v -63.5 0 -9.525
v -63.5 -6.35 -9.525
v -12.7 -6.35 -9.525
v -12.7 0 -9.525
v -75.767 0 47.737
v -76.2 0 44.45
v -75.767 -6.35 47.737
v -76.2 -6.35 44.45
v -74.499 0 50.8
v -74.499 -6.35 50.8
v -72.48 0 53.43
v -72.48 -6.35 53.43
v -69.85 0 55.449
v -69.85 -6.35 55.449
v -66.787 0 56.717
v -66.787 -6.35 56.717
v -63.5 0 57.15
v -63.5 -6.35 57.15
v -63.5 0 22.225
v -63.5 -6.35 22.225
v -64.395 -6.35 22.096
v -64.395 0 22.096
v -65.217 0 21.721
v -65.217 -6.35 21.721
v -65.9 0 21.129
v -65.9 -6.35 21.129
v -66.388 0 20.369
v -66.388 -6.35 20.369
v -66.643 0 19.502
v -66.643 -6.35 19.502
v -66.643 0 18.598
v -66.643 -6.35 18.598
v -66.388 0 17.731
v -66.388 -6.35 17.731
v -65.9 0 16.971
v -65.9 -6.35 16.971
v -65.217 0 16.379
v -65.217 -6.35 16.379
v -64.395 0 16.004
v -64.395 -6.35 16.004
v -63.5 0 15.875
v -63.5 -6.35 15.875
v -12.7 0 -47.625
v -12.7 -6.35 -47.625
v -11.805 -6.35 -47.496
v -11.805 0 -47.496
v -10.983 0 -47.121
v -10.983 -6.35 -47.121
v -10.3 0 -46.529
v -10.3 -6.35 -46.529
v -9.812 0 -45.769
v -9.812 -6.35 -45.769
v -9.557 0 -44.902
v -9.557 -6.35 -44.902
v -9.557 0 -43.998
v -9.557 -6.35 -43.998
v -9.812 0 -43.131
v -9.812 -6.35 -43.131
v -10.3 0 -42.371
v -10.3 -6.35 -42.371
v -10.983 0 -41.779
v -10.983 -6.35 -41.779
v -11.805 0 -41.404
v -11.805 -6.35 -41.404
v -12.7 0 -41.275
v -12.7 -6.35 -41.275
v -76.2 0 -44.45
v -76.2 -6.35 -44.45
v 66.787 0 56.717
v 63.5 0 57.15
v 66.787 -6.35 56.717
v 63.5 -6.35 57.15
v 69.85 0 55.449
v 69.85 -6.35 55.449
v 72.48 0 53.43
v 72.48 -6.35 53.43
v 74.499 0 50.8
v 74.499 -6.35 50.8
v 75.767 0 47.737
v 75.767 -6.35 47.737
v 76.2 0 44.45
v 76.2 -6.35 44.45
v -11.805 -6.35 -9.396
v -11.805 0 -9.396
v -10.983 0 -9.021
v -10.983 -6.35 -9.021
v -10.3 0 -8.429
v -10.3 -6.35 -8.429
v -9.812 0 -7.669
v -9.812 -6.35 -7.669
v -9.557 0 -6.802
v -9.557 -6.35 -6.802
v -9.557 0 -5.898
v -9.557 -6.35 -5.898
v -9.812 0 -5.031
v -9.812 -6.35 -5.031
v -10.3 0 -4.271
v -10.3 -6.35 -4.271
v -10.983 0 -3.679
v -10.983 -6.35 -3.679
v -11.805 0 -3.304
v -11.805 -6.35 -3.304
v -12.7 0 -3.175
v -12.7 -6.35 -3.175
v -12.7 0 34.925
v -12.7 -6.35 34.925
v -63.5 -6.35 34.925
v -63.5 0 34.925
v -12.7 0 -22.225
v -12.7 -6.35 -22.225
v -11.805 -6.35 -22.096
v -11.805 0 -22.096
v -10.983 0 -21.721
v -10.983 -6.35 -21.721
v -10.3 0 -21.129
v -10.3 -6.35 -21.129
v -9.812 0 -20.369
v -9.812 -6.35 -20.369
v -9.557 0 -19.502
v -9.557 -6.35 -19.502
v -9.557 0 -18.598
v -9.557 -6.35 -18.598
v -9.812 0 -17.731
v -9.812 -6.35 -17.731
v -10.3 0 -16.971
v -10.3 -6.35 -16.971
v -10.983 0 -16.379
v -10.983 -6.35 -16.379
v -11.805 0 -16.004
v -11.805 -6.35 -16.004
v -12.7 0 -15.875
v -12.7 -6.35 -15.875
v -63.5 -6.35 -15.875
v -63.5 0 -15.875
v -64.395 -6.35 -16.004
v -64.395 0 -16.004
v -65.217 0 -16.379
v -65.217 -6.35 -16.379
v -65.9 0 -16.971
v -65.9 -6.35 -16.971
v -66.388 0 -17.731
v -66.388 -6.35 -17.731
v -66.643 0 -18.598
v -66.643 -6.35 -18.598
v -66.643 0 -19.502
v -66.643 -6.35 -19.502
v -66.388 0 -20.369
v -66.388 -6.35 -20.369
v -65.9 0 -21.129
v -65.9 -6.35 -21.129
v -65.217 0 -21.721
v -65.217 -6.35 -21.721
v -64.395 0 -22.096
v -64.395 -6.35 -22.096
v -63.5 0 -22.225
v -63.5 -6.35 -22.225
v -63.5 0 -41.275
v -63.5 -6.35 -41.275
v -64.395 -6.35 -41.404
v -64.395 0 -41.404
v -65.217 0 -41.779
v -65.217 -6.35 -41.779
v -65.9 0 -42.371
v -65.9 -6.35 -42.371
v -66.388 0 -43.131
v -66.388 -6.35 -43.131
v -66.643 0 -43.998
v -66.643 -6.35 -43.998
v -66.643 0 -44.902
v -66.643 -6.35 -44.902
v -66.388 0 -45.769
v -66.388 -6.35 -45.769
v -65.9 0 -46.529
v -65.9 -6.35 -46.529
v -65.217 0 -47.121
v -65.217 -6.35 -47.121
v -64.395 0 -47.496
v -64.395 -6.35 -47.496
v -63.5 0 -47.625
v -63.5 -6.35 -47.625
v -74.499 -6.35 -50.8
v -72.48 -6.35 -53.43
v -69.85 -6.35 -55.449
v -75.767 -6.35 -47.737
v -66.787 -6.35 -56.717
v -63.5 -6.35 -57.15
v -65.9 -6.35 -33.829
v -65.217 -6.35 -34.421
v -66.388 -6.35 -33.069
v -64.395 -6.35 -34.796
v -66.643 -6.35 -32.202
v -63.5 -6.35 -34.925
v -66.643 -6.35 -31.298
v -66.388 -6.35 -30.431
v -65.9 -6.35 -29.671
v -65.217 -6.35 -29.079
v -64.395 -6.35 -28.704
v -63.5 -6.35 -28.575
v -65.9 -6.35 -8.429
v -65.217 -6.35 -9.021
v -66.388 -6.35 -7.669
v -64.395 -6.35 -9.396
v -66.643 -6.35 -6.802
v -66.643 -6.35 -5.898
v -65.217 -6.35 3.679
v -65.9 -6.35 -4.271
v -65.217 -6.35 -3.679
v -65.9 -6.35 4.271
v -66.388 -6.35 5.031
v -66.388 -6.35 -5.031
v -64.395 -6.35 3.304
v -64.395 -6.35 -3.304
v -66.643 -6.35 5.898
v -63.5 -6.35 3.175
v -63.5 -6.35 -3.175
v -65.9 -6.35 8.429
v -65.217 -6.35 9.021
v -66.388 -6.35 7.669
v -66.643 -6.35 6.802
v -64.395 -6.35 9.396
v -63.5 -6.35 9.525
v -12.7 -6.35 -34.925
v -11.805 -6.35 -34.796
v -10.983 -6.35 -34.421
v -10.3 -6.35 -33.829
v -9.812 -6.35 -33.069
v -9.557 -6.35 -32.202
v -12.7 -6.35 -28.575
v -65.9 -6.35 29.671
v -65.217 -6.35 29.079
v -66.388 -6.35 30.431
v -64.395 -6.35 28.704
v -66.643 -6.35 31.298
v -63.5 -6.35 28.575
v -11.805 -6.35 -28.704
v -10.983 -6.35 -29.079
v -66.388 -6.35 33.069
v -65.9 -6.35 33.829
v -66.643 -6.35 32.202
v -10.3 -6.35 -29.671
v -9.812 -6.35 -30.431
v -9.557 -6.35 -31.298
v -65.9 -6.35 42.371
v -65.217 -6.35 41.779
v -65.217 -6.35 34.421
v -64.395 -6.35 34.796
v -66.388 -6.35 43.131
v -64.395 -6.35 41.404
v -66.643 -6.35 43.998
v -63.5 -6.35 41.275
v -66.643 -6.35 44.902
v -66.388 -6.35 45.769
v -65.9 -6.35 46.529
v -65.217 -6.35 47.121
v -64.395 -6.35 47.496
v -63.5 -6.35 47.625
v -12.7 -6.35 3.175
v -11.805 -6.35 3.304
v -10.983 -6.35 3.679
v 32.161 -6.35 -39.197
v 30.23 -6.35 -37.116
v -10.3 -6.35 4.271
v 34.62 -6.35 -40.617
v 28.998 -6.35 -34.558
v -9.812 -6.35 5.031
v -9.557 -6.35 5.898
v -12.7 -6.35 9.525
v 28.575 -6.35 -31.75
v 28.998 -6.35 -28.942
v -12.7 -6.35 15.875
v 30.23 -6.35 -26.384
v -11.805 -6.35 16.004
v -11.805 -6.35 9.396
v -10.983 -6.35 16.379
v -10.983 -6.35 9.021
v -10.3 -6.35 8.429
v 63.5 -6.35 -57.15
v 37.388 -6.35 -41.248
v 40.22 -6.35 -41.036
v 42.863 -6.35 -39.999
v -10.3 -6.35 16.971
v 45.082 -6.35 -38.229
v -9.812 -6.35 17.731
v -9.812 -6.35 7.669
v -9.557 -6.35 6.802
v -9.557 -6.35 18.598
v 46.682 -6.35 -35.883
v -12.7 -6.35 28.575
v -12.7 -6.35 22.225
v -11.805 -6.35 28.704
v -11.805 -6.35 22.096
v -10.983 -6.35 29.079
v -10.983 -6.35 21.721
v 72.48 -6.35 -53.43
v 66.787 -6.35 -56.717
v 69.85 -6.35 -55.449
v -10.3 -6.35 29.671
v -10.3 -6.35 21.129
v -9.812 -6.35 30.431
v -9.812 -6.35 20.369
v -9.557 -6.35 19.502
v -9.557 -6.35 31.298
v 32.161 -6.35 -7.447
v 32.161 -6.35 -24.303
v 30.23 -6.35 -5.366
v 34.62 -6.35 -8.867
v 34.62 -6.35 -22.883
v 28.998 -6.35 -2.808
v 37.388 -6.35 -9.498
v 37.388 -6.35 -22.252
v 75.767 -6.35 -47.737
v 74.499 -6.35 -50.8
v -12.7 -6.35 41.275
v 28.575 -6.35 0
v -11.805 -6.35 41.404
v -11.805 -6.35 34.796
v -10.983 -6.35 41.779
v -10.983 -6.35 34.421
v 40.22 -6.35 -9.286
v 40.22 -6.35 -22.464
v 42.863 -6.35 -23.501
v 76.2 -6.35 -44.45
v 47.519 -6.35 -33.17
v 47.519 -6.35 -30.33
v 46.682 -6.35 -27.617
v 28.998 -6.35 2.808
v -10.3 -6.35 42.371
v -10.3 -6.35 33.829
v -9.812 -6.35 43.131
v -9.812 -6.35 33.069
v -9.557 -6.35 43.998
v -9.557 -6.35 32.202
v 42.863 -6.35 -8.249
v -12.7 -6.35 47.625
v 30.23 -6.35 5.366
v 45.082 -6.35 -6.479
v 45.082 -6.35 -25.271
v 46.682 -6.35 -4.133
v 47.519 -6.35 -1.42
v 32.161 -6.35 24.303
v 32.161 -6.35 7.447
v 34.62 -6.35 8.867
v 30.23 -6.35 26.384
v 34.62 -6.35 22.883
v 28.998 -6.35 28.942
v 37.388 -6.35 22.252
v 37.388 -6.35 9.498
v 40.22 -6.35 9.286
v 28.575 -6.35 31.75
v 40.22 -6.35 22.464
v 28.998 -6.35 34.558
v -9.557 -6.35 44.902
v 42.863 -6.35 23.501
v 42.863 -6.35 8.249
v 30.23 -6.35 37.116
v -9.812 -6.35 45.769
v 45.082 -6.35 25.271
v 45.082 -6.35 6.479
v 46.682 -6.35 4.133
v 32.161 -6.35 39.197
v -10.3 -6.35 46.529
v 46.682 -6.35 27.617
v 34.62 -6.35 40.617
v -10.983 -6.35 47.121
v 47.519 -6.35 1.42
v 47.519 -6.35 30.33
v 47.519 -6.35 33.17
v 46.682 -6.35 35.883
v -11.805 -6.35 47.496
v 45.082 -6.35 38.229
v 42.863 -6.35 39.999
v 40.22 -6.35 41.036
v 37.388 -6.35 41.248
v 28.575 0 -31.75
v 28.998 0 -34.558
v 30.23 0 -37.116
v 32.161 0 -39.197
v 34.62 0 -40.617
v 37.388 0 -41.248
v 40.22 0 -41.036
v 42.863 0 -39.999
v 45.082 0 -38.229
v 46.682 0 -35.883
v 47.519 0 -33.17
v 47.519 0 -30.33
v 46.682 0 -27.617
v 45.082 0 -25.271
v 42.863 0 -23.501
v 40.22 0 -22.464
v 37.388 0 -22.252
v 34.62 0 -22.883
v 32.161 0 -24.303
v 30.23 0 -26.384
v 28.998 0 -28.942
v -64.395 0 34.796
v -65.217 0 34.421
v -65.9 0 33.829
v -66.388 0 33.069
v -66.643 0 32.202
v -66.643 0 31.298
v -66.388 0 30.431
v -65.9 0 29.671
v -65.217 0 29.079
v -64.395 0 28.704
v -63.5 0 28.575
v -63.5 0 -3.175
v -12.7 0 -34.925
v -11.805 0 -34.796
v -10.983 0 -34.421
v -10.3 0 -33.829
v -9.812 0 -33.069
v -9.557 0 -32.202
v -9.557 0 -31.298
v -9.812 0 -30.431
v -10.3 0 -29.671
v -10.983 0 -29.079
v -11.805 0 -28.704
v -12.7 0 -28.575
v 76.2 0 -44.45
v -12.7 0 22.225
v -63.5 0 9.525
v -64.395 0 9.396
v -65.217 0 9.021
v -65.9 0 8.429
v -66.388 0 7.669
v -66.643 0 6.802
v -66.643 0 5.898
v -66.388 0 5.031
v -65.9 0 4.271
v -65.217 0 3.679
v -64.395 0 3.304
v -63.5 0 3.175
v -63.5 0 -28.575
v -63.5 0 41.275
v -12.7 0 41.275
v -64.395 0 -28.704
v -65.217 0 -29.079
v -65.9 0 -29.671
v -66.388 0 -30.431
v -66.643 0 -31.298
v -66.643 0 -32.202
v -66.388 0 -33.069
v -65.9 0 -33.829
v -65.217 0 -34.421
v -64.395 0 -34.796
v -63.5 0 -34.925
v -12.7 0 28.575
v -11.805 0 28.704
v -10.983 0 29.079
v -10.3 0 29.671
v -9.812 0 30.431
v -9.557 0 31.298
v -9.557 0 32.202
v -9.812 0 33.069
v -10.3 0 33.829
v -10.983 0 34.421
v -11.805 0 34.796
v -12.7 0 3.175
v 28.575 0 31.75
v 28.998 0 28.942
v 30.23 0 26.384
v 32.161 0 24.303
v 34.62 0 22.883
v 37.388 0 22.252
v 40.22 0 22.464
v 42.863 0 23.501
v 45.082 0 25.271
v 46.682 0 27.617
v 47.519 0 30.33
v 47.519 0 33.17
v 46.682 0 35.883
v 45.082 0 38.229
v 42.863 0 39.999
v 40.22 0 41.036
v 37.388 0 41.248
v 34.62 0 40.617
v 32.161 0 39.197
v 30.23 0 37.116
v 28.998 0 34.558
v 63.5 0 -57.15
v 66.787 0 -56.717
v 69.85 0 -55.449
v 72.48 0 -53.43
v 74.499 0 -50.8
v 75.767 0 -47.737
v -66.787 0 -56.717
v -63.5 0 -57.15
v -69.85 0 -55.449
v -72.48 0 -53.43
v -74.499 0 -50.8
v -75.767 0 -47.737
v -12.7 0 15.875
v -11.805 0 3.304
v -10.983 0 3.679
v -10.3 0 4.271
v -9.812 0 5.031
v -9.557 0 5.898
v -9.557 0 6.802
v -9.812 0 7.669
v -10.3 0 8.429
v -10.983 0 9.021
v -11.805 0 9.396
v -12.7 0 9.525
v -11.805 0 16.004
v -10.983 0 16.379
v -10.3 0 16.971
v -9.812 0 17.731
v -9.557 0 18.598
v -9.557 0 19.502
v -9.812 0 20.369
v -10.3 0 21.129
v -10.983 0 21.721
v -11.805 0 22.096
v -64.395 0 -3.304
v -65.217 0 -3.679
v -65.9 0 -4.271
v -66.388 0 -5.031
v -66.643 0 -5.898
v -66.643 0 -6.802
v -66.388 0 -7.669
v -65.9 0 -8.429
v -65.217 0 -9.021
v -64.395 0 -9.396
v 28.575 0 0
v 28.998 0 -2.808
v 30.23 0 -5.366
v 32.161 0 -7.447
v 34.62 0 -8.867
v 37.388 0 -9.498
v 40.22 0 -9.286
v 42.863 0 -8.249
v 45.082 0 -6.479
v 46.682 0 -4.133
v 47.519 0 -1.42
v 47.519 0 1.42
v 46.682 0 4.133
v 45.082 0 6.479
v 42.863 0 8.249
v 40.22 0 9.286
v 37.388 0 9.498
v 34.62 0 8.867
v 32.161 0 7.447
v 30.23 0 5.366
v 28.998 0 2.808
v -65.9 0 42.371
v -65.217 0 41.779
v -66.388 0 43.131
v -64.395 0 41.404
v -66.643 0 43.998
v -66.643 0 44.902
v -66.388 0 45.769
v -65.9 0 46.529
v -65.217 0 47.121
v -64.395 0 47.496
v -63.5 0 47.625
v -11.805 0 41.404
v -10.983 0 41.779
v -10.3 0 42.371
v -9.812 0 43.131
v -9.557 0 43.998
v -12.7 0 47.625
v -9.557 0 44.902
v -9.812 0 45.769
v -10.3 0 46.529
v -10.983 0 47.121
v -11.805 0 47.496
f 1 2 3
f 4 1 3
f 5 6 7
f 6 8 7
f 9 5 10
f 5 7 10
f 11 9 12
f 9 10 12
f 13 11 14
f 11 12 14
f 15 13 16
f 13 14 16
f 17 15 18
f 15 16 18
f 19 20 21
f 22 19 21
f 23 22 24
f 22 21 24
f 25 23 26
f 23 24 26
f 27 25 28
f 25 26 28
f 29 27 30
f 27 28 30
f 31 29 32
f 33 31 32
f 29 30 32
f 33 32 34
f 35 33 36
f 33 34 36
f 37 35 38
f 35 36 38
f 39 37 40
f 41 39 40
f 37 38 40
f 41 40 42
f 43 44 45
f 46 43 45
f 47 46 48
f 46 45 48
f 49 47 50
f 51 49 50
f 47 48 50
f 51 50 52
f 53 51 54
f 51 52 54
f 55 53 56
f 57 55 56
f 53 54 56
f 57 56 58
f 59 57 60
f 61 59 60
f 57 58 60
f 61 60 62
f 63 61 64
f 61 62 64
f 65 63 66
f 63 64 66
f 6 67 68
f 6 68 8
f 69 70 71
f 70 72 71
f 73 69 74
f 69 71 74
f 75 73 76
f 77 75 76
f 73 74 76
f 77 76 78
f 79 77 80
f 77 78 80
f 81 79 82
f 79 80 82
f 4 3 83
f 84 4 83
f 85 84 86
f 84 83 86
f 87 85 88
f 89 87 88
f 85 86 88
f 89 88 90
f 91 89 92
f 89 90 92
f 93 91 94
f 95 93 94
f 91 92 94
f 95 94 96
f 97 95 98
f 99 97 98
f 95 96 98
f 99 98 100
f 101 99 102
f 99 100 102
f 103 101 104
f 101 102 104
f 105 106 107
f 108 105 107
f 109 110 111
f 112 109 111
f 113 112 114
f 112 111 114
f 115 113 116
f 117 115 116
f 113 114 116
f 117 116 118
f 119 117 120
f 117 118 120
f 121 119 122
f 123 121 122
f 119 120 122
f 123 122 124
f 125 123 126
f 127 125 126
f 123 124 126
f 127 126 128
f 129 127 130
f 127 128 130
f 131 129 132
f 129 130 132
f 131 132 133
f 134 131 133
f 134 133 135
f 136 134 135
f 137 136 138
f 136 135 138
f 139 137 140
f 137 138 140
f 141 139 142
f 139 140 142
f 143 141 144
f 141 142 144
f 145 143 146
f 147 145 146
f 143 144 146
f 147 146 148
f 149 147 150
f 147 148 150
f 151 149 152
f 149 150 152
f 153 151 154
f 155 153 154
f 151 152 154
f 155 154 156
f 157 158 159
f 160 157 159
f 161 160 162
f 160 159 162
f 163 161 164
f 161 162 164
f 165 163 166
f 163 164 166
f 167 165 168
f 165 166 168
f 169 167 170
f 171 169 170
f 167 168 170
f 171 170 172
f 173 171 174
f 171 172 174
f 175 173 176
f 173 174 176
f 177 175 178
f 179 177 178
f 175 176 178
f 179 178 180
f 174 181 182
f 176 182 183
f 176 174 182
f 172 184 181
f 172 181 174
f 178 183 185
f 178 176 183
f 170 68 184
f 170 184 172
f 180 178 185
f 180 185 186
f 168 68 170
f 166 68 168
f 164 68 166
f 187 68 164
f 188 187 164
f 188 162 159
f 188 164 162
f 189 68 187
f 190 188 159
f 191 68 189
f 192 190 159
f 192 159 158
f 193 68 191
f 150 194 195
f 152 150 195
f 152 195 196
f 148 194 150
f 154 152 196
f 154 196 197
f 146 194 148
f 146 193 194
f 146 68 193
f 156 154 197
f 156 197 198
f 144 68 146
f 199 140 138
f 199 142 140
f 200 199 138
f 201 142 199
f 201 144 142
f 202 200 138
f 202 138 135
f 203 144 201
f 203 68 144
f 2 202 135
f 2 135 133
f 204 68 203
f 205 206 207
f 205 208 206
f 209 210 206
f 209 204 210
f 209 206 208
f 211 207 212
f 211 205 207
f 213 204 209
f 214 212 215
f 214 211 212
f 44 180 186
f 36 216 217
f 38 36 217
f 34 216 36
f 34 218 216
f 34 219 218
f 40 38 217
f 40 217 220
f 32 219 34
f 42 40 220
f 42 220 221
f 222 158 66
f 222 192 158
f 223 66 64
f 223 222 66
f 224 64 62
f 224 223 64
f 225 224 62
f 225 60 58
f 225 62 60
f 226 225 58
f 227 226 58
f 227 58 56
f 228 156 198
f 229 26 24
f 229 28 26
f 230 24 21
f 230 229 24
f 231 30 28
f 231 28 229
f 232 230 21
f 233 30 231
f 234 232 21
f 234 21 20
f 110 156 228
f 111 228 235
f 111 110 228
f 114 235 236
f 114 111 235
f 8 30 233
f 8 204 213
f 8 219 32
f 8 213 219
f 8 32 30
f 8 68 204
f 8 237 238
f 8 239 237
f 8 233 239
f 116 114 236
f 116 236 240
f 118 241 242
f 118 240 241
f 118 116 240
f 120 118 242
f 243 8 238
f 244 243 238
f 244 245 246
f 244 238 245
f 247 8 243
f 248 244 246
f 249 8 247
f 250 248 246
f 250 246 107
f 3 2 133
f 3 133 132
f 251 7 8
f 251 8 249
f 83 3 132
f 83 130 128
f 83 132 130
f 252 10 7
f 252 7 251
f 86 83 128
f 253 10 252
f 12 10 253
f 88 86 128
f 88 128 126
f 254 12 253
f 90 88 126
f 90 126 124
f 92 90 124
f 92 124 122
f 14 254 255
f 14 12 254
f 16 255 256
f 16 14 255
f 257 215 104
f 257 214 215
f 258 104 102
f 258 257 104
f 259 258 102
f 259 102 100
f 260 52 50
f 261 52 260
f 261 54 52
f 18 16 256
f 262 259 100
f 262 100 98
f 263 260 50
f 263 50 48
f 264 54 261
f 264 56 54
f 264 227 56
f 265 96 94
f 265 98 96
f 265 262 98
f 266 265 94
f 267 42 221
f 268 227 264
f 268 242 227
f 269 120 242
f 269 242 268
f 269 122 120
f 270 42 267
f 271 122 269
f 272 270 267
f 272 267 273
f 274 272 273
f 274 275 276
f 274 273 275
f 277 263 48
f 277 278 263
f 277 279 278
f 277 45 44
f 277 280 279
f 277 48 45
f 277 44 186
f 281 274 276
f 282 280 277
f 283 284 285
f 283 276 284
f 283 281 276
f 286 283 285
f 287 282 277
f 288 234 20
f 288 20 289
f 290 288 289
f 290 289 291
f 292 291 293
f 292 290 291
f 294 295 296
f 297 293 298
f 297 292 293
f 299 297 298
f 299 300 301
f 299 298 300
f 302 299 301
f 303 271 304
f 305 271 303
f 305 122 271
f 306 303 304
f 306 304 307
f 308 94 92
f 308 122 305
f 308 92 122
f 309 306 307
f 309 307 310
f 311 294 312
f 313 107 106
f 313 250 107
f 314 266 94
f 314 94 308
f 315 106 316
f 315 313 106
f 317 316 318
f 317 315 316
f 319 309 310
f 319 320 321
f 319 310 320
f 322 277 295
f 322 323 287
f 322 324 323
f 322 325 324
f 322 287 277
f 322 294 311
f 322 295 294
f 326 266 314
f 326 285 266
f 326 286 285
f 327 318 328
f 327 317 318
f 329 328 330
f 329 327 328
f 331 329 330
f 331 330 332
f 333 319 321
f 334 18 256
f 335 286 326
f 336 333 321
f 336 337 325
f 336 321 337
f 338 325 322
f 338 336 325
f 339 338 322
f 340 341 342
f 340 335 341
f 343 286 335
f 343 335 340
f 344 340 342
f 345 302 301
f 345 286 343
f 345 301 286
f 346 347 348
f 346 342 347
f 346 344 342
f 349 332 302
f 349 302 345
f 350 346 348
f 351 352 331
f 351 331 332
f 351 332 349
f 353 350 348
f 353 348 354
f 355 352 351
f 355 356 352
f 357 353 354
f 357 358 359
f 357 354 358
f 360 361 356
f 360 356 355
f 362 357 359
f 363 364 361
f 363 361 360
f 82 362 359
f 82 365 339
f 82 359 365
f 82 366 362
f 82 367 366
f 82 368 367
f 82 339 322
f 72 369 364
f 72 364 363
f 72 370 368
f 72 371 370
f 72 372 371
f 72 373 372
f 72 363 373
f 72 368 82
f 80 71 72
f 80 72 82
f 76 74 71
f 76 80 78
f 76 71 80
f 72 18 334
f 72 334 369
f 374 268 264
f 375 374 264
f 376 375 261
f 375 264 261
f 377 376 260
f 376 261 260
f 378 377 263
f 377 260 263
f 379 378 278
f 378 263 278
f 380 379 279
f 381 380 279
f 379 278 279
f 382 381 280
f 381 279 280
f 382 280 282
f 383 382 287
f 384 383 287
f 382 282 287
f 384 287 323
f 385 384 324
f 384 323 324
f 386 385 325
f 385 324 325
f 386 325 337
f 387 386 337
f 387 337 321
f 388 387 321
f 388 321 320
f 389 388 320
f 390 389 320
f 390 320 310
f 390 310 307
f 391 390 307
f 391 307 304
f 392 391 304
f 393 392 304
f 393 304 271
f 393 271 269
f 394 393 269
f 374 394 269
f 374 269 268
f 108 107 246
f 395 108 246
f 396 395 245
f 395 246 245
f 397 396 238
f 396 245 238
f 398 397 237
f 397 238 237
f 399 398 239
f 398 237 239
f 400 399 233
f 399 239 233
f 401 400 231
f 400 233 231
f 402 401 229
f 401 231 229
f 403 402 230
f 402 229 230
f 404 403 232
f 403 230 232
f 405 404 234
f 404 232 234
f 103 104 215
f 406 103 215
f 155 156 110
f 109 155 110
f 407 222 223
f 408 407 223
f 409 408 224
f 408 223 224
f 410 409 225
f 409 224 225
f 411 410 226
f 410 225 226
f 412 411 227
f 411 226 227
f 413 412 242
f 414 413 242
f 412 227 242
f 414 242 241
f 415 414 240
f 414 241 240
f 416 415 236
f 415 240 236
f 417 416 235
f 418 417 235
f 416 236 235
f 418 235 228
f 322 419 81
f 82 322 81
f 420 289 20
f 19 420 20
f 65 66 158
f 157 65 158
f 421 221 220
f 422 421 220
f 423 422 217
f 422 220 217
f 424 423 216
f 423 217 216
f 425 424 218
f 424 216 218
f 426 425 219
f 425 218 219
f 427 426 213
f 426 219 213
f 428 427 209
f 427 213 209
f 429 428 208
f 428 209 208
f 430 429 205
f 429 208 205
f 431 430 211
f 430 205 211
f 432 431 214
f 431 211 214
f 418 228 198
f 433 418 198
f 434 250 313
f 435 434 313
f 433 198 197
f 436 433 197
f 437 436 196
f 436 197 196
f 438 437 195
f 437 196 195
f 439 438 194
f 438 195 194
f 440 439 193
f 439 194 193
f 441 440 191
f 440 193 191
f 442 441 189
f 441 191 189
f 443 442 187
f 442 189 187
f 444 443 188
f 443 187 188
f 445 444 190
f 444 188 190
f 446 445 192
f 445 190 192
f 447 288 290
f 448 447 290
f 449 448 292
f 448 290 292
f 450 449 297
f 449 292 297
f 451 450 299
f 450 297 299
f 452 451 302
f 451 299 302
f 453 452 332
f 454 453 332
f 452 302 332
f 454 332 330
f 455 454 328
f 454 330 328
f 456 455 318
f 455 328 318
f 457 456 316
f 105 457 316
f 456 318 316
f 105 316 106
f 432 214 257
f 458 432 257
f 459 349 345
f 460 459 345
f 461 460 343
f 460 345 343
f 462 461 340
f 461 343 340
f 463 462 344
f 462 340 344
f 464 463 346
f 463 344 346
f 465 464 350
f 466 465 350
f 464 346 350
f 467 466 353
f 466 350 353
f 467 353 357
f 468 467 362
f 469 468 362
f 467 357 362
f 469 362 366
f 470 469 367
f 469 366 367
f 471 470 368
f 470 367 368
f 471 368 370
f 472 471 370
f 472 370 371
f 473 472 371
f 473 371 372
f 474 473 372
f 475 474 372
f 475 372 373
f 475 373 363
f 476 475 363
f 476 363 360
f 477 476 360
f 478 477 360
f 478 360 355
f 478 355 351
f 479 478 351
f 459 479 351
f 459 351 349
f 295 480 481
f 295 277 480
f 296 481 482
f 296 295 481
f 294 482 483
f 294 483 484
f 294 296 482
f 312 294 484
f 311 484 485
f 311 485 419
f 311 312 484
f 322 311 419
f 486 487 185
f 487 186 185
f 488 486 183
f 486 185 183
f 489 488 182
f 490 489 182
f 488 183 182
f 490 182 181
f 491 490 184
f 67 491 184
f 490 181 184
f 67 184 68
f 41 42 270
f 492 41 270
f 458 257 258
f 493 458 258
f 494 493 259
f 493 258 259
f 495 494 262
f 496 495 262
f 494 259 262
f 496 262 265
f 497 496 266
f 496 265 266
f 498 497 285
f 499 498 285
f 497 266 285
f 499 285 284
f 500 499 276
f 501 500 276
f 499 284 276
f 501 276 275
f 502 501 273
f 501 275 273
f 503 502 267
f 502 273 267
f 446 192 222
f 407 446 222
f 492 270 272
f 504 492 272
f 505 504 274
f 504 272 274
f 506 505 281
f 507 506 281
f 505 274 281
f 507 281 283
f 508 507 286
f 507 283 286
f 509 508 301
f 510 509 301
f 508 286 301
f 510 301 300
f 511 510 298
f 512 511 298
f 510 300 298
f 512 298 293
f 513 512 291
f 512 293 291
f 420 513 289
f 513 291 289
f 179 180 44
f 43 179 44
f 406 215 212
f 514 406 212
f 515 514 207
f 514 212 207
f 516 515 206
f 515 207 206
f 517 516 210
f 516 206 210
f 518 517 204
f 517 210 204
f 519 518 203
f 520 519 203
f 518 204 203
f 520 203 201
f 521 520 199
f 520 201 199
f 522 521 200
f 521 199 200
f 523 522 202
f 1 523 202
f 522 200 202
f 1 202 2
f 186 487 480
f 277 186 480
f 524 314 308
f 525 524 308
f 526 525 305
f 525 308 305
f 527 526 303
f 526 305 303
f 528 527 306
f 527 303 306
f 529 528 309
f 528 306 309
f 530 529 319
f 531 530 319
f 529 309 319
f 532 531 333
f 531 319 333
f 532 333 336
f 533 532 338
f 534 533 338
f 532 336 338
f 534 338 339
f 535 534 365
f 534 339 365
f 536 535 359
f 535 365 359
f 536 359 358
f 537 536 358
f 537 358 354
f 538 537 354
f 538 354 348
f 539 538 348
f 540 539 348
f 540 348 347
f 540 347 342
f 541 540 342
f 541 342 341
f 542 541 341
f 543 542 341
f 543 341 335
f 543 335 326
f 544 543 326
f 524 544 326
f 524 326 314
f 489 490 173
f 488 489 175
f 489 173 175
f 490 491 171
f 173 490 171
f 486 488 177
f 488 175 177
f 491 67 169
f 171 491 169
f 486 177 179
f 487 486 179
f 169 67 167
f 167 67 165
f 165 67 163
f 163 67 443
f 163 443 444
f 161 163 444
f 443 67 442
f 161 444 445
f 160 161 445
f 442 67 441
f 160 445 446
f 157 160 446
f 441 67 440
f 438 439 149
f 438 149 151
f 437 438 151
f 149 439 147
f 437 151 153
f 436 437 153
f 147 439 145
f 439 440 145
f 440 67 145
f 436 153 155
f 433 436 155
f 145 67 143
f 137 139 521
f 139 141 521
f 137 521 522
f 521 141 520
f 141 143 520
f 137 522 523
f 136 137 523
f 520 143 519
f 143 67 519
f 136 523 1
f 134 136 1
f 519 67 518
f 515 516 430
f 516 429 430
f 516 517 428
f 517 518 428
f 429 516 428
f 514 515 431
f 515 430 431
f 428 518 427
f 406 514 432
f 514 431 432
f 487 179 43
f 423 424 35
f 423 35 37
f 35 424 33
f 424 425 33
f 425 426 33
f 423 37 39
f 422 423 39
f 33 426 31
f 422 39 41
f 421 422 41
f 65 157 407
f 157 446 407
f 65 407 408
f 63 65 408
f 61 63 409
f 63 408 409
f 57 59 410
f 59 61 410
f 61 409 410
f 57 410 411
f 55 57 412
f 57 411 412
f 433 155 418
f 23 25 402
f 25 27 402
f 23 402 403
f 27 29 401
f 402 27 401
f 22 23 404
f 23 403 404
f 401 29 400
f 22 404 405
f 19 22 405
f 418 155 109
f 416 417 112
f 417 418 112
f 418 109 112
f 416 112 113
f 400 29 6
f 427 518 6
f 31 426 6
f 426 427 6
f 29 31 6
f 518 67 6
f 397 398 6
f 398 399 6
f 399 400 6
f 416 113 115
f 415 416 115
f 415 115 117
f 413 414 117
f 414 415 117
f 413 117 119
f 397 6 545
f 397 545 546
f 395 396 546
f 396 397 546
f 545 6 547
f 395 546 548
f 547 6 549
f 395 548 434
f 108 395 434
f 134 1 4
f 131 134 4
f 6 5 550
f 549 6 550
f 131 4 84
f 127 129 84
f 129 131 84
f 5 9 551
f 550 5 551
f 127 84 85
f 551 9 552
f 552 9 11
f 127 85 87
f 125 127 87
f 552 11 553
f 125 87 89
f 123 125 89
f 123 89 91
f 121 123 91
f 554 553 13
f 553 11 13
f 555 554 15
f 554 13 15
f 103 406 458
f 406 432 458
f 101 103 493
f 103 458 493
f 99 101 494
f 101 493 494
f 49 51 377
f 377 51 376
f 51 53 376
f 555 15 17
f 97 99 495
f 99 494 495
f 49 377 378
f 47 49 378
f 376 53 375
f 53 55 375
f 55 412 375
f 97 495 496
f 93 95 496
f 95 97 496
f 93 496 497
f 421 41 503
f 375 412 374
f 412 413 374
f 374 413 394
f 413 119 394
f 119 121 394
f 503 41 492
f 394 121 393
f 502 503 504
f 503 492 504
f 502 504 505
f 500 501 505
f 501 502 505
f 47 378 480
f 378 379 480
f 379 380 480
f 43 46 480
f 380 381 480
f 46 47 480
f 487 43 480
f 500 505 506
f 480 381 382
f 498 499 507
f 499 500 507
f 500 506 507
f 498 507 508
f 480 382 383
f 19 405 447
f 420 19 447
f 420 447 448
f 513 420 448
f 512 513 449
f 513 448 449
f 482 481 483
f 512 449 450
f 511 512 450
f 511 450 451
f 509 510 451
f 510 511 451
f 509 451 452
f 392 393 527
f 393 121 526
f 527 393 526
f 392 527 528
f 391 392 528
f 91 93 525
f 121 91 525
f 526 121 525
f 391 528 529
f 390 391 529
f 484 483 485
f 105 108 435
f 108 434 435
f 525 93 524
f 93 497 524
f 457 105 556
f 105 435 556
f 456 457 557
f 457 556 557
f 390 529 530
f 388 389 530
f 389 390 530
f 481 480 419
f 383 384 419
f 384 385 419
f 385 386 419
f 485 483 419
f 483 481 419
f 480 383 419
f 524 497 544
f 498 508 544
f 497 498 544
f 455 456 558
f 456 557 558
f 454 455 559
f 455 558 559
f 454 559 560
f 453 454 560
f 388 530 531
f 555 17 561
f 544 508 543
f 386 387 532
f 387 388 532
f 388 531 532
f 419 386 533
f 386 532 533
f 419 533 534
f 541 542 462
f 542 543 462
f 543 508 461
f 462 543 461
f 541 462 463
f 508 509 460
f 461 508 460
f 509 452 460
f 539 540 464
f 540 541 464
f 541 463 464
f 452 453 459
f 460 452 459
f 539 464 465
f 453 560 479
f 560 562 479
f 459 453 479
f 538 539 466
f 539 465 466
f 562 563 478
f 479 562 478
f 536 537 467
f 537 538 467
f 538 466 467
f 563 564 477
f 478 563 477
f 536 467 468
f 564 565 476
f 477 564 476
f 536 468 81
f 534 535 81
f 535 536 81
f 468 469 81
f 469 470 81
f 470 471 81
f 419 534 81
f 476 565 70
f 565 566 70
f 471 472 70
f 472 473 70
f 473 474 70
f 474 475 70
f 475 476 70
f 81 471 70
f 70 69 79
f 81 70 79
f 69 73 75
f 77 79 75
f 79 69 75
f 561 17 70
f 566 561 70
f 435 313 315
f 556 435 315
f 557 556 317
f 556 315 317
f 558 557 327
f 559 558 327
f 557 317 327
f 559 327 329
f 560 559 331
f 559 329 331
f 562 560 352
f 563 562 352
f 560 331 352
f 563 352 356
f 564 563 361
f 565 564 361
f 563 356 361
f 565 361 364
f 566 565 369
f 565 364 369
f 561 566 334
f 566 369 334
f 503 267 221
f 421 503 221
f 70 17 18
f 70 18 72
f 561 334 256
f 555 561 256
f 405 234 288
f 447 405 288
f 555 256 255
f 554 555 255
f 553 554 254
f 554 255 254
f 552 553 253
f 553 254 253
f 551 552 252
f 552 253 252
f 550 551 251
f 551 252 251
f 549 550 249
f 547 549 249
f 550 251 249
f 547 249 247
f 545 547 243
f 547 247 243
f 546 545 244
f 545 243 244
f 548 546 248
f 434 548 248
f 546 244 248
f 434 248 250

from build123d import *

# Parameters (mm, degrees)
F0_W     = 152.4
F0_H     = 114.3
F1_DEPTH = 6.35
F3_DEPTH = 6.351
F5_D     = 19.05
F6_R     = 12.7
F7_R     = 12.7


with BuildPart() as f1:
    # F0 (on Front) → F1 (new body)
    with BuildSketch(Plane.XZ):
        Rectangle(F0_W, F0_H)
    extrude(amount=F1_DEPTH)

    # F2 (on face) → F3 (cut, through all)
    with BuildSketch(Plane.XZ.offset(6.35)):
        with BuildLine():
            Line((-12.7, 47.625), (-63.5, 47.625))
            ThreePointArc((-63.5, 47.625), (-66.675, 44.45), (-63.5, 41.275))
            Line((-63.5, 41.275), (-12.7, 41.275))
            ThreePointArc((-12.7, 41.275), (-9.525, 44.45), (-12.7, 47.625))
        make_face()
        with BuildLine():
            Line((-12.7, -41.275), (-63.5, -41.275))
            ThreePointArc((-63.5, -41.275), (-66.675, -44.45), (-63.5, -47.625))
            Line((-63.5, -47.625), (-12.7, -47.625))
            ThreePointArc((-12.7, -47.625), (-9.525, -44.45), (-12.7, -41.275))
        make_face()
        with BuildLine():
            ThreePointArc((-63.5, 34.925), (-66.675, 31.75), (-63.5, 28.575))
            Line((-63.5, 28.575), (-12.7, 28.575))
            ThreePointArc((-12.7, 28.575), (-9.525, 31.75), (-12.7, 34.925))
            Line((-12.7, 34.925), (-63.5, 34.925))
        make_face()
        with BuildLine():
            Line((-12.7, -28.575), (-63.5, -28.575))
            ThreePointArc((-63.5, -28.575), (-66.675, -31.75), (-63.5, -34.925))
            Line((-63.5, -34.925), (-12.7, -34.925))
            ThreePointArc((-12.7, -34.925), (-9.525, -31.75), (-12.7, -28.575))
        make_face()
        with BuildLine():
            Line((-12.7, 22.225), (-63.5, 22.225))
            ThreePointArc((-63.5, 22.225), (-66.675, 19.05), (-63.5, 15.875))
            Line((-63.5, 15.875), (-12.7, 15.875))
            ThreePointArc((-12.7, 15.875), (-9.525, 19.05), (-12.7, 22.225))
        make_face()
        with BuildLine():
            Line((-12.7, -15.875), (-63.5, -15.875))
            ThreePointArc((-63.5, -15.875), (-66.675, -19.05), (-63.5, -22.225))
            Line((-63.5, -22.225), (-12.7, -22.225))
            ThreePointArc((-12.7, -22.225), (-9.525, -19.05), (-12.7, -15.875))
        make_face()
        with BuildLine():
            Line((-12.7, 9.525), (-63.5, 9.525))
            ThreePointArc((-63.5, 9.525), (-66.675, 6.35), (-63.5, 3.175))
            Line((-63.5, 3.175), (-12.7, 3.175))
            ThreePointArc((-12.7, 3.175), (-9.525, 6.35), (-12.7, 9.525))
        make_face()
        with BuildLine():
            ThreePointArc((-63.5, -3.175), (-66.675, -6.35), (-63.5, -9.525))
            Line((-63.5, -9.525), (-12.7, -9.525))
            ThreePointArc((-12.7, -9.525), (-9.525, -6.35), (-12.7, -3.175))
            Line((-12.7, -3.175), (-63.5, -3.175))
        make_face()
    extrude(amount=-F3_DEPTH, mode=Mode.SUBTRACT)

    # F5 (through all)
    with Locations(Plane(origin=(0, 0, 0), x_dir=(1, 0, 0), z_dir=(0, 1, 0))):
        with Locations((38.1, 31.75), (38.1, 0), (38.1, -31.75)):
            Hole(F5_D / 2)

    # F6
    f6_edges = [f1.edges().sort_by_distance(p)[0] for p in [
        (76.2, -3.175, 57.15),
        (76.2, -3.175, -57.15),
    ]]
    fillet(f6_edges, radius=F6_R)

    # F7
    f7_edges = [f1.edges().sort_by_distance(p)[0] for p in [
        (-76.2, -3.175, 57.15),
        (-76.2, -3.175, -57.15),
    ]]
    fillet(f7_edges, radius=F7_R)


solid = f1.part
